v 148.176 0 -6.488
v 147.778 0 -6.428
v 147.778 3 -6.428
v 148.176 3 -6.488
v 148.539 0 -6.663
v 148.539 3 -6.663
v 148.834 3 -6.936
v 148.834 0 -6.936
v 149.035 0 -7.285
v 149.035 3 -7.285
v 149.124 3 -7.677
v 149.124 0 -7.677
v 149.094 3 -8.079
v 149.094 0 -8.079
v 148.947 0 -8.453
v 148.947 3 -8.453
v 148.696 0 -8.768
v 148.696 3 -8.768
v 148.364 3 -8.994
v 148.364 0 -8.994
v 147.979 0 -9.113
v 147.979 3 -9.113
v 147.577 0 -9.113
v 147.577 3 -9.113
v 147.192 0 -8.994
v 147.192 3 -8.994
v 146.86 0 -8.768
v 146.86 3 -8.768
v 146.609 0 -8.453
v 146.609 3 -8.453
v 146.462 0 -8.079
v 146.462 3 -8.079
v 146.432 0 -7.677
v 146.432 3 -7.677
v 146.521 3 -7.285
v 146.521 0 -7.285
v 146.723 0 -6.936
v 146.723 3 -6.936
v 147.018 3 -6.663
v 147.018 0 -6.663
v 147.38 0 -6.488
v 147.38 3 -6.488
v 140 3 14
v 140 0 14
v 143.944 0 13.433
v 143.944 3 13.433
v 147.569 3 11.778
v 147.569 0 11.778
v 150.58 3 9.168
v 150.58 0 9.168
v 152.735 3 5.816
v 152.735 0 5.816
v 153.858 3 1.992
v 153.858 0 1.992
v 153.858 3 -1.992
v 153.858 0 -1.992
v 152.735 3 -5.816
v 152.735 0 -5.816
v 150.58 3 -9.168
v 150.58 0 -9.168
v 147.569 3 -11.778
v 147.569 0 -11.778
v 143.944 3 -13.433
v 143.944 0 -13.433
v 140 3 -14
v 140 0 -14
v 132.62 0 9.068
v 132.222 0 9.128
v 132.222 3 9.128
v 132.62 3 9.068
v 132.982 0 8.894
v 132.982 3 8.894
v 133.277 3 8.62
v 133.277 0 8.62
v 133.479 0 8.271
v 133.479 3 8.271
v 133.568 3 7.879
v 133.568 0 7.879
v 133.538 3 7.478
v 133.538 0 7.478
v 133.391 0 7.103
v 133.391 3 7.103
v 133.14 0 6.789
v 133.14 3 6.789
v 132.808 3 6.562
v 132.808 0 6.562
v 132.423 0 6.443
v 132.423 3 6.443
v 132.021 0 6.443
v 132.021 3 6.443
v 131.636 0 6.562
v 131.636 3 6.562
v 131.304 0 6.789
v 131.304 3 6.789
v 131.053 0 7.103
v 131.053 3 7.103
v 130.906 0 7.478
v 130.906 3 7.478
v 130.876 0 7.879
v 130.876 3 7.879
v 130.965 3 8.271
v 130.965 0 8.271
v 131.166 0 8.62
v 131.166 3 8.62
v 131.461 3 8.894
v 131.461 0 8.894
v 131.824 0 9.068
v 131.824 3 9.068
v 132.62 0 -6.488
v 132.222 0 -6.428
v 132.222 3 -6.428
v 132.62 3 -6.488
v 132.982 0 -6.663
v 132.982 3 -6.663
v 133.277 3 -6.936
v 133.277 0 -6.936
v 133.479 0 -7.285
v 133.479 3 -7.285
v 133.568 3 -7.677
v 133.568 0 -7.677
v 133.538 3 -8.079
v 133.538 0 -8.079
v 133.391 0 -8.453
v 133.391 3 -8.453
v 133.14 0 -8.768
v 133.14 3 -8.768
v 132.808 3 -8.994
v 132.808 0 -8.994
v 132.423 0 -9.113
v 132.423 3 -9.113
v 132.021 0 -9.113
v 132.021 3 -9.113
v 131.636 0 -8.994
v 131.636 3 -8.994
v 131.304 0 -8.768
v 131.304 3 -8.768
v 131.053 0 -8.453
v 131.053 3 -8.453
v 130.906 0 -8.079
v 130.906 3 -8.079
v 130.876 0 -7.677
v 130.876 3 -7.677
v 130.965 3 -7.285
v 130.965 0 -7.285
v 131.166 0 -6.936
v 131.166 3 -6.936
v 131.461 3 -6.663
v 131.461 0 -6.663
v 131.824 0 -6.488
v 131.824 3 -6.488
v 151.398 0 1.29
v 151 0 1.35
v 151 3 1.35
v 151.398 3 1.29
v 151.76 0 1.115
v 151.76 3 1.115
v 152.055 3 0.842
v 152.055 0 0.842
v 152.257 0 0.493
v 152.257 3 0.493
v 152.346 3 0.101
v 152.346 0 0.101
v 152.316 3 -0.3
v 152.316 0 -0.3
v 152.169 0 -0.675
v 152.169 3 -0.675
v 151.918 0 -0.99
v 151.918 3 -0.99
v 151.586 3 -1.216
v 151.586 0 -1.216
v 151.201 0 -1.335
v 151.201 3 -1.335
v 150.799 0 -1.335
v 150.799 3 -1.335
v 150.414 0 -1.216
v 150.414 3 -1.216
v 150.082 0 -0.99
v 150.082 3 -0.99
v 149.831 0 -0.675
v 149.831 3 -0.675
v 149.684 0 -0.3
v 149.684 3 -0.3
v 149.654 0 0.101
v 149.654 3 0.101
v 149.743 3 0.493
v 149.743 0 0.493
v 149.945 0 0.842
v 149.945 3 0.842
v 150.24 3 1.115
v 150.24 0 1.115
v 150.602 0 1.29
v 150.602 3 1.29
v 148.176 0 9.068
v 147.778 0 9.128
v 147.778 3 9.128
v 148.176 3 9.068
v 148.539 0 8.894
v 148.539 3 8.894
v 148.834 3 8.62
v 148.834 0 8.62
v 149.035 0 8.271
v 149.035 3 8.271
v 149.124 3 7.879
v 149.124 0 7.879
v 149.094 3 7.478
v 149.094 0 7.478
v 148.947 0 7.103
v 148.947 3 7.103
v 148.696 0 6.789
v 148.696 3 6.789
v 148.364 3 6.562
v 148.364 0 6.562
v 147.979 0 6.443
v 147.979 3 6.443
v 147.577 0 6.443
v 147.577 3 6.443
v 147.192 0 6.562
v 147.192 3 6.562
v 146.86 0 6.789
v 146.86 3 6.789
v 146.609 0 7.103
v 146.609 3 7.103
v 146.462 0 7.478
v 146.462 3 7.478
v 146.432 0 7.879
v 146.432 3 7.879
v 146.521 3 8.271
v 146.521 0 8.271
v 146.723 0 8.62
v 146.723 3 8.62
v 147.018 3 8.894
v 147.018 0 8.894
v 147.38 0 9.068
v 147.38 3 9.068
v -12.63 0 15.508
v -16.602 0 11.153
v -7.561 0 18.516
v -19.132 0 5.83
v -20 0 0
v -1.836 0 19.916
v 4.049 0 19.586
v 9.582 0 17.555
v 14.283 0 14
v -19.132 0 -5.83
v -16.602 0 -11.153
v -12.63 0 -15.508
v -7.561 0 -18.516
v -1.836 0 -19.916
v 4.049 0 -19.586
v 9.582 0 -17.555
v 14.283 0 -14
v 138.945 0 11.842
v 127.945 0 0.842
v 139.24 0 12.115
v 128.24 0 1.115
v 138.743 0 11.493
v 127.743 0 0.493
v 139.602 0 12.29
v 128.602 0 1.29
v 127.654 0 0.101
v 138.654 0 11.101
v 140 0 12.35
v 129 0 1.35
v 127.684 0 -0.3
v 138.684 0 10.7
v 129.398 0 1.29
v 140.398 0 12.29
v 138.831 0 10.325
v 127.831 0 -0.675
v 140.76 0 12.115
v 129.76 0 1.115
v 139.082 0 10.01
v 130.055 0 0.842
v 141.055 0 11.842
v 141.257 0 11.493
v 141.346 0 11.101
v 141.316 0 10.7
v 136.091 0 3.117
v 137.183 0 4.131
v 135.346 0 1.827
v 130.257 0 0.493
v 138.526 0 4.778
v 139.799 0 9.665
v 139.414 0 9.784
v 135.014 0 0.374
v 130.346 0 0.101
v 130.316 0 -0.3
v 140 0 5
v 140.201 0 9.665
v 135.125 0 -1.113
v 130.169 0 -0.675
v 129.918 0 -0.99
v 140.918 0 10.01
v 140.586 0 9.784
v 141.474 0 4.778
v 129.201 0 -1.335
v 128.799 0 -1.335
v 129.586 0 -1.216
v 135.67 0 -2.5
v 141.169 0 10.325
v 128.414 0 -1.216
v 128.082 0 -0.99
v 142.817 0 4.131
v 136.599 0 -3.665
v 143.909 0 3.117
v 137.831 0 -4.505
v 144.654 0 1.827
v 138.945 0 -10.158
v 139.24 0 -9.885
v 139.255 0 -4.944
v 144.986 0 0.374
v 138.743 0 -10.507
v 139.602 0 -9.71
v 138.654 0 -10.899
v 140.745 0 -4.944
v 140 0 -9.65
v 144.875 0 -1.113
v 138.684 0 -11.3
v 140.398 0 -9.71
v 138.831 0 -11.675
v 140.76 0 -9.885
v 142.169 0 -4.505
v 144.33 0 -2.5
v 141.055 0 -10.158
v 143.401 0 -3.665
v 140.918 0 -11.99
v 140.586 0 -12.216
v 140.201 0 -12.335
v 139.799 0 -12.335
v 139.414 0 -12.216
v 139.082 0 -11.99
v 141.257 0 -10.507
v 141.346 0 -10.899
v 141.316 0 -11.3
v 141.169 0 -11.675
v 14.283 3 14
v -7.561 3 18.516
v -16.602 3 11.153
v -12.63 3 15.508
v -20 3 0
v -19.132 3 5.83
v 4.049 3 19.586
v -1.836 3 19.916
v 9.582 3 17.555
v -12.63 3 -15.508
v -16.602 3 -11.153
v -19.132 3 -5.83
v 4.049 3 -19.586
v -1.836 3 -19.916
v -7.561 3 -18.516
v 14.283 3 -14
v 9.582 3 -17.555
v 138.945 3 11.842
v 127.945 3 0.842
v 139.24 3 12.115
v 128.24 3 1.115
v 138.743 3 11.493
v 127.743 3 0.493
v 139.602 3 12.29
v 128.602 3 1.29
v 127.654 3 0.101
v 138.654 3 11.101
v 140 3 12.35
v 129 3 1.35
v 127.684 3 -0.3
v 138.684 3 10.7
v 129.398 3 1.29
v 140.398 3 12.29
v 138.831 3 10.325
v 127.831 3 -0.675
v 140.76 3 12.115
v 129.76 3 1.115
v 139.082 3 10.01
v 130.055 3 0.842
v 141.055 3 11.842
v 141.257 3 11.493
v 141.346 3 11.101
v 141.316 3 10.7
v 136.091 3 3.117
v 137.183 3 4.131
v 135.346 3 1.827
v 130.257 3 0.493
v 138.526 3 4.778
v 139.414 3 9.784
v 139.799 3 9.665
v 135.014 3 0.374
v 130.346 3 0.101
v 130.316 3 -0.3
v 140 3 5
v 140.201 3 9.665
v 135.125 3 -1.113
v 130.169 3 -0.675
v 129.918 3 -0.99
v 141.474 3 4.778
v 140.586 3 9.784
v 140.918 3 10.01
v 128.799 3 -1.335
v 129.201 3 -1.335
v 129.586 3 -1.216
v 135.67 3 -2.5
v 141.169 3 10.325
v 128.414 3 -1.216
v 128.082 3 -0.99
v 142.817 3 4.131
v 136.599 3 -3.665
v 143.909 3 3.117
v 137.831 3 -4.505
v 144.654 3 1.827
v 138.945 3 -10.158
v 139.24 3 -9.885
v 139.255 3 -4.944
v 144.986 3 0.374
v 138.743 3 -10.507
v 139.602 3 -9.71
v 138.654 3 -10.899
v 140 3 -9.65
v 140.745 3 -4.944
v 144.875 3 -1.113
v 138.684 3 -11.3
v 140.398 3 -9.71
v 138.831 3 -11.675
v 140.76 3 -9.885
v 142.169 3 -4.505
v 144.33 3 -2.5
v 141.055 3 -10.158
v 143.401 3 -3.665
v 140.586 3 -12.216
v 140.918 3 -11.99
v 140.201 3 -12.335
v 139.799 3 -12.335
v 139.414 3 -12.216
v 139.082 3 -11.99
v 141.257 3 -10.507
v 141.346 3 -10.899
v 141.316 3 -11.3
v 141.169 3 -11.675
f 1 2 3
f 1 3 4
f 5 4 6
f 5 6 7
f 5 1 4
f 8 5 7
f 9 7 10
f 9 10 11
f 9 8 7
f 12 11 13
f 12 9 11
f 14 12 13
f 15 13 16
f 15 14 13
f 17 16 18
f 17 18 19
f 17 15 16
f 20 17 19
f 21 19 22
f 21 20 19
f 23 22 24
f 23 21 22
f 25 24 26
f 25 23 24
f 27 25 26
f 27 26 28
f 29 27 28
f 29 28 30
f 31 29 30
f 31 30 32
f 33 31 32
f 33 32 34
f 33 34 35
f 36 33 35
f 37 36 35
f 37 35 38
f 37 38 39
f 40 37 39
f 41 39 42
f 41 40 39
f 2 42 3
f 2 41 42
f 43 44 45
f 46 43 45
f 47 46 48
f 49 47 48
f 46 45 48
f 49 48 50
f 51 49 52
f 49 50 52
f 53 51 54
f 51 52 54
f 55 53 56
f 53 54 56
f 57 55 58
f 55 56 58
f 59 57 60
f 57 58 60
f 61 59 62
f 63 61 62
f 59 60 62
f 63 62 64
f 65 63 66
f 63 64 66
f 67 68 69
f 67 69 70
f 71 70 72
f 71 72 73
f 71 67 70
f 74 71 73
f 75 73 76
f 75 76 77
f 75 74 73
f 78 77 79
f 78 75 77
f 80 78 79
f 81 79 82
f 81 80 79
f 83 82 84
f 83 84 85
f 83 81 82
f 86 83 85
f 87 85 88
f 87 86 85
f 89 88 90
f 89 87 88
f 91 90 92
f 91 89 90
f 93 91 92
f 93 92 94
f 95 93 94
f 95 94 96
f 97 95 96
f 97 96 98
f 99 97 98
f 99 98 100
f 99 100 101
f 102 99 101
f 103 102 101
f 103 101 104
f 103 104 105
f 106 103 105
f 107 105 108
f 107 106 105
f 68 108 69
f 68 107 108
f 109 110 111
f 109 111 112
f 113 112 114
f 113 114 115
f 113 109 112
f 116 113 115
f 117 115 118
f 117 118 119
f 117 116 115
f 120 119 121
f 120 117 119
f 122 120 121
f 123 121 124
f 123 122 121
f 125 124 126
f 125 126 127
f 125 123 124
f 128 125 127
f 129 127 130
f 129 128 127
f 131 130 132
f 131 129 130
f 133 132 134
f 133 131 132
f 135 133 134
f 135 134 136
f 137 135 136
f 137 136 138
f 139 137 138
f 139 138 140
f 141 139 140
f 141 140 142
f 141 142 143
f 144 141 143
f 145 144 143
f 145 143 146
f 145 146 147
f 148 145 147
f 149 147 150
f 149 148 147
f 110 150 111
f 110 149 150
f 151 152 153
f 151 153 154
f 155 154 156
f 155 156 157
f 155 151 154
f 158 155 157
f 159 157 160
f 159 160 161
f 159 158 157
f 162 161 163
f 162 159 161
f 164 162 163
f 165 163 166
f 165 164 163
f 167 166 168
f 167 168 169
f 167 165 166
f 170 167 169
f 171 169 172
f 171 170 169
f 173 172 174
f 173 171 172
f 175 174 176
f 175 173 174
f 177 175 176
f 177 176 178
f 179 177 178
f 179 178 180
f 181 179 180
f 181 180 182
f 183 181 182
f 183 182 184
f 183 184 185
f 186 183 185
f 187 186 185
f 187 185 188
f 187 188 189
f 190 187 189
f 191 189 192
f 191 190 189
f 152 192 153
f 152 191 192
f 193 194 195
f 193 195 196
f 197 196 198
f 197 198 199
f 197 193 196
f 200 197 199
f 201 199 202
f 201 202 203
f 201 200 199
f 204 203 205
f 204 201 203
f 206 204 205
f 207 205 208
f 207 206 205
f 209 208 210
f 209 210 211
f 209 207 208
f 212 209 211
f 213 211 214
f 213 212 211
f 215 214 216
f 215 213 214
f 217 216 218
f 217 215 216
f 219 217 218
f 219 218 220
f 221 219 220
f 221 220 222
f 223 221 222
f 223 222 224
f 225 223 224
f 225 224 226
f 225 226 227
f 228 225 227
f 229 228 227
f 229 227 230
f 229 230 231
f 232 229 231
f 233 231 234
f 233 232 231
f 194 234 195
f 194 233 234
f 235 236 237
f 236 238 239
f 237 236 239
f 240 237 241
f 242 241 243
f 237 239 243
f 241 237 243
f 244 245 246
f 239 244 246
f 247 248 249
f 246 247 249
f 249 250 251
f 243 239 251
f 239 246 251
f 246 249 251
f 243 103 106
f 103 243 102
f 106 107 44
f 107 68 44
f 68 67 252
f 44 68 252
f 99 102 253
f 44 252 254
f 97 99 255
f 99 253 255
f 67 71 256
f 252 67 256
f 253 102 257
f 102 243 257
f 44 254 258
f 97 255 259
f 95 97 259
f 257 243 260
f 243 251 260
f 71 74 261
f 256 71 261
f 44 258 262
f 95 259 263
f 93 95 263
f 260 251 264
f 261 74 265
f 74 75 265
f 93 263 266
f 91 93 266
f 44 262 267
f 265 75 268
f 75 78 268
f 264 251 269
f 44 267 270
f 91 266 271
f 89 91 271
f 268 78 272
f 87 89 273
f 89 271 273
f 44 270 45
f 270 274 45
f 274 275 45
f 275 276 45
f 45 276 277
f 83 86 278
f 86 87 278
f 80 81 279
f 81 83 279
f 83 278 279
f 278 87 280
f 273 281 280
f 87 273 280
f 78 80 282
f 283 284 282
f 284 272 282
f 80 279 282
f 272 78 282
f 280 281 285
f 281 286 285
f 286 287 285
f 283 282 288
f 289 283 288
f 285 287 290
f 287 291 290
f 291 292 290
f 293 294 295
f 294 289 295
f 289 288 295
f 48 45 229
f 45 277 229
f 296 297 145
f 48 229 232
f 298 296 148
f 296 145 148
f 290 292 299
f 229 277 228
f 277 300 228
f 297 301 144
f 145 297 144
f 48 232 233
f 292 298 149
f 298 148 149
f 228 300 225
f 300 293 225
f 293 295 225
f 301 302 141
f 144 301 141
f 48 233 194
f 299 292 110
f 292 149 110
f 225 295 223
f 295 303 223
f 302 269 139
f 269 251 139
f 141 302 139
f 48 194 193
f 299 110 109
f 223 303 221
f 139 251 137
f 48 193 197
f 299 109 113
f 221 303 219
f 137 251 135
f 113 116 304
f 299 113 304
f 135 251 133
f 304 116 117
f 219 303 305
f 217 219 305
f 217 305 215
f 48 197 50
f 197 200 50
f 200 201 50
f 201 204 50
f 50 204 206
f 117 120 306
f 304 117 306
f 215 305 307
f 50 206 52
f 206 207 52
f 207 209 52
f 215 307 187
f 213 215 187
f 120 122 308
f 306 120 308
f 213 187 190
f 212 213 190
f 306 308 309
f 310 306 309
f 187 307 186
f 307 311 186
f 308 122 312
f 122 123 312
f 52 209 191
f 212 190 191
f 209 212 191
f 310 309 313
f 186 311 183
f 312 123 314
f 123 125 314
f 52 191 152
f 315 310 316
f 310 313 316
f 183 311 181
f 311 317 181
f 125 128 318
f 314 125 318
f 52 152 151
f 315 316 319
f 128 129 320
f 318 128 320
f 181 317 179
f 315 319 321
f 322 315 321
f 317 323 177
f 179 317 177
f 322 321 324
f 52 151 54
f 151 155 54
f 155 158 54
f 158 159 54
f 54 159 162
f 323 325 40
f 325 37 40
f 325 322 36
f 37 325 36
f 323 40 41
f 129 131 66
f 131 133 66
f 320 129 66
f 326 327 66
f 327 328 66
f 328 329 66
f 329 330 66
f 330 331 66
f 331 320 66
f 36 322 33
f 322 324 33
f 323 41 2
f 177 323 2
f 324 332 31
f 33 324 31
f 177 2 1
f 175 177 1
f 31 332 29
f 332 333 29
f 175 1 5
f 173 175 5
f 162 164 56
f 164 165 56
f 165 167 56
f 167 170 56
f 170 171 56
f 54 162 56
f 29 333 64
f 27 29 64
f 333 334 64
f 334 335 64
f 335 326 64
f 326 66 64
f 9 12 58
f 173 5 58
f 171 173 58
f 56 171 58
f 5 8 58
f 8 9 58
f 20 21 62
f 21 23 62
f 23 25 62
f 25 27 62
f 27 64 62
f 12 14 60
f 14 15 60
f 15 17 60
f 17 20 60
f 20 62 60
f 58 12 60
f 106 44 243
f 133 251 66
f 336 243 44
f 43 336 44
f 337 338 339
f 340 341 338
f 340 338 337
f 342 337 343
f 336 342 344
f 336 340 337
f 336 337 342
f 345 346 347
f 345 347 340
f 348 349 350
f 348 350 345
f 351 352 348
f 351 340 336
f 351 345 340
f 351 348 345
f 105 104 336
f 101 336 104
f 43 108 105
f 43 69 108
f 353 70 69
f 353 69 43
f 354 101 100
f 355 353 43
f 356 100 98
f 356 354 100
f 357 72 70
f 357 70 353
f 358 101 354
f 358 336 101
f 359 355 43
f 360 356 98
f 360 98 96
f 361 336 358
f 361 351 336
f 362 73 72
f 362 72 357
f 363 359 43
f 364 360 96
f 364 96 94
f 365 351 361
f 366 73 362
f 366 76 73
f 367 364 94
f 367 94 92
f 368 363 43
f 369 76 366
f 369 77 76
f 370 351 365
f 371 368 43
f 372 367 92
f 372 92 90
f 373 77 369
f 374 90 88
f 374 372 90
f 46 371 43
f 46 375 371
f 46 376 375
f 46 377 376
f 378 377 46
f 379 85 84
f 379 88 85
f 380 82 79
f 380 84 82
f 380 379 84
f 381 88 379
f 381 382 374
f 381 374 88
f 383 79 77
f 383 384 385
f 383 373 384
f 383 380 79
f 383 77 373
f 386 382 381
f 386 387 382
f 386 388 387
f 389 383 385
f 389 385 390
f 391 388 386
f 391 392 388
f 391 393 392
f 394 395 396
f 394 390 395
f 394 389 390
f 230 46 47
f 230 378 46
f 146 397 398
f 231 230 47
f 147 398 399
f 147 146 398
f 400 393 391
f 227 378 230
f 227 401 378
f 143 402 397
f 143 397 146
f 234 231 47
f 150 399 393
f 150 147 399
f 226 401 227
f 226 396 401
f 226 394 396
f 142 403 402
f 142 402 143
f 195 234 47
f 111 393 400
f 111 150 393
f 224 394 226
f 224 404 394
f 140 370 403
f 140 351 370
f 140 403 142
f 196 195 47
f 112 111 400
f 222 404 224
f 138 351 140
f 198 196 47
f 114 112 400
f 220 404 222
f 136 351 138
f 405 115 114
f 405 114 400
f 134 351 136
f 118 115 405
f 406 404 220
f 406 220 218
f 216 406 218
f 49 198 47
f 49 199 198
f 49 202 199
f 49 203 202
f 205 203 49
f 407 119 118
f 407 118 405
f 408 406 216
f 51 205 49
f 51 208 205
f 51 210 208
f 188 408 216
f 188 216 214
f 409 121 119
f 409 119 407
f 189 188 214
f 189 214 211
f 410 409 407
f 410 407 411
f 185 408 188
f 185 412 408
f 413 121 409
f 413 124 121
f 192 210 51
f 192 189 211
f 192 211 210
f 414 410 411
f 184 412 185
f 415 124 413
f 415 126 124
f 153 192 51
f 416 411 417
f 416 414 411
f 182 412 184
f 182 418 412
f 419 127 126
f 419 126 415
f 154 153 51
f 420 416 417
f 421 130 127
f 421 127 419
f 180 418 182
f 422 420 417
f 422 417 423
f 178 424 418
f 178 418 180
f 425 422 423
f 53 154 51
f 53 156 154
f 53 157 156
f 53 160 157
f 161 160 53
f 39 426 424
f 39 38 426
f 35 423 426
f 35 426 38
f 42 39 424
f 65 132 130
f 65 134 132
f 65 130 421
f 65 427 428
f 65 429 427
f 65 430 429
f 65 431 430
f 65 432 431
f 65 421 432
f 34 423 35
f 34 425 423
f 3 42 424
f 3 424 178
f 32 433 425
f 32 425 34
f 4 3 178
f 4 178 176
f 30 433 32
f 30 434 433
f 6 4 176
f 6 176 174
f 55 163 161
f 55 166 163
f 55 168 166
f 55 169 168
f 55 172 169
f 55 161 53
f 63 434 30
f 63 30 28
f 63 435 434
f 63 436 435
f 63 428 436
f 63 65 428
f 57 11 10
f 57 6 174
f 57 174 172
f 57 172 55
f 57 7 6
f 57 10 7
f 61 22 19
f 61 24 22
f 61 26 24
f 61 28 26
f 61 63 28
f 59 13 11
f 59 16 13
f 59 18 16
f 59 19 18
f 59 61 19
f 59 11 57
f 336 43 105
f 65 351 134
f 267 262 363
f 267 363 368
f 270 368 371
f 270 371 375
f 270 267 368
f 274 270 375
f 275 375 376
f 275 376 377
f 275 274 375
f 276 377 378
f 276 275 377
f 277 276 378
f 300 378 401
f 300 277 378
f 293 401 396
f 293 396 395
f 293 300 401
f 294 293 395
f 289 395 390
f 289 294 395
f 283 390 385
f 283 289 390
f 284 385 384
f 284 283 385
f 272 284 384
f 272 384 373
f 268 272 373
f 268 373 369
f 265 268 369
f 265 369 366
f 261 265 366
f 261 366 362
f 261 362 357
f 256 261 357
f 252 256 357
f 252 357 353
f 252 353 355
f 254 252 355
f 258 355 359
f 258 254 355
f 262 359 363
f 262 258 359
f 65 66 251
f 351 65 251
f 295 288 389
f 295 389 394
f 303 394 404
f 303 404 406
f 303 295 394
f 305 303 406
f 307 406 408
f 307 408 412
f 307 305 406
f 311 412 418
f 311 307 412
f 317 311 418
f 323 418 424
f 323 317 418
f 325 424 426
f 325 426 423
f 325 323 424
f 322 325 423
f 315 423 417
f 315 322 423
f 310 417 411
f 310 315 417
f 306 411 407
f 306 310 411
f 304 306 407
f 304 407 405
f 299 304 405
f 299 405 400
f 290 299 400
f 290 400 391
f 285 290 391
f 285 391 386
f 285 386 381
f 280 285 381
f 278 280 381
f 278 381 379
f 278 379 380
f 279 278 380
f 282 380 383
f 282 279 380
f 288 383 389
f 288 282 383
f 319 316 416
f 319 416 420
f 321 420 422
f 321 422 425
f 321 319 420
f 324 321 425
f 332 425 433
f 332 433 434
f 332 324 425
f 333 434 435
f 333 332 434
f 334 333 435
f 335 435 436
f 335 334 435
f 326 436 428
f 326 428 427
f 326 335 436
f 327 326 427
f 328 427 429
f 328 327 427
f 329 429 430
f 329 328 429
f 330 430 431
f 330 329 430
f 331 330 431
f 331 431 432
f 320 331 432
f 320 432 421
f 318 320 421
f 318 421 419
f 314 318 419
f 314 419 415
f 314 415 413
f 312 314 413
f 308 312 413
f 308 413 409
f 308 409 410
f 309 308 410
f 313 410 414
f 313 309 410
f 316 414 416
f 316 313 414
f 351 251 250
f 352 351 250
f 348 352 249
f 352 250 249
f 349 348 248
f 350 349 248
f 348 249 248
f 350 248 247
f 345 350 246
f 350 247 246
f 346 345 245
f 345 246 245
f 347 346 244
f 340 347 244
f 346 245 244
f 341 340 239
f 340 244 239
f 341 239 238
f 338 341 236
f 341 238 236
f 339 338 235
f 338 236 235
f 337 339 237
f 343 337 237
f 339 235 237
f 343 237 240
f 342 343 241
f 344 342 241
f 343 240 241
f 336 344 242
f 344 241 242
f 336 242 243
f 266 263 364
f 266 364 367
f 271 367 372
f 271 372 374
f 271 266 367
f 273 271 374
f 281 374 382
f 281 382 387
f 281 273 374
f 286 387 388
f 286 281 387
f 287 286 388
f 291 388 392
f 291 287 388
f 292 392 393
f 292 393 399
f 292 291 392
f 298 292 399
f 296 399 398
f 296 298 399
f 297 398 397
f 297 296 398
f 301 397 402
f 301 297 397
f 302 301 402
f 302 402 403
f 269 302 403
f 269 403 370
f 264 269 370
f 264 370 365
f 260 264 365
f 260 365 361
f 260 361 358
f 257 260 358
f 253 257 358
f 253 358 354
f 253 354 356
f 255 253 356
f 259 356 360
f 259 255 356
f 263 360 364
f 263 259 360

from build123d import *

# Parameters (mm, degrees)
SKETCH_1_R      = 5
SKETCH_1_R_2    = 1.35
EXTRUDE_1_DEPTH = 3


with BuildPart() as part:
    # 草图1 → 凸台-拉伸1 (new body)
    with BuildSketch(Plane(origin=(0, 0, 0), x_dir=(1, 0, 0), z_dir=(0, 1, 0))):
        with BuildLine():
            Line((14.282856857, -14), (140, -14))
            ThreePointArc((140, -14), (154, 0), (140, 14))
            Line((140, 14), (14.282856857, 14))
            ThreePointArc((14.282856857, 14), (-20, 0), (14.282856857, -14))
        make_face()
        with Locations(Location((140, 0, 0), (0, 0, 270))):
            Circle(SKETCH_1_R, mode=Mode.SUBTRACT)
        with Locations(Location((140, 11, 0), (0, 0, 270))):
            Circle(SKETCH_1_R_2, mode=Mode.SUBTRACT)
        with Locations(Location((147.778174593, 7.778174593, 0), (0, 0, 270))):
            Circle(SKETCH_1_R_2, mode=Mode.SUBTRACT)
        with Locations(Location((151, 0, 0), (0, 0, 270))):
            Circle(SKETCH_1_R_2, mode=Mode.SUBTRACT)
        with Locations(Location((147.778174593, -7.778174593, 0), (0, 0, 270))):
            Circle(SKETCH_1_R_2, mode=Mode.SUBTRACT)
        with Locations(Location((140, -11, 0), (0, 0, 270))):
            Circle(SKETCH_1_R_2, mode=Mode.SUBTRACT)
        with Locations(Location((132.221825407, -7.778174593, 0), (0, 0, 270))):
            Circle(SKETCH_1_R_2, mode=Mode.SUBTRACT)
        with Locations(Location((129, 0, 0), (0, 0, 270))):
            Circle(SKETCH_1_R_2, mode=Mode.SUBTRACT)
        with Locations(Location((132.221825407, 7.778174593, 0), (0, 0, 270))):
            Circle(SKETCH_1_R_2, mode=Mode.SUBTRACT)
    extrude(amount=EXTRUDE_1_DEPTH)


solid = part.part
